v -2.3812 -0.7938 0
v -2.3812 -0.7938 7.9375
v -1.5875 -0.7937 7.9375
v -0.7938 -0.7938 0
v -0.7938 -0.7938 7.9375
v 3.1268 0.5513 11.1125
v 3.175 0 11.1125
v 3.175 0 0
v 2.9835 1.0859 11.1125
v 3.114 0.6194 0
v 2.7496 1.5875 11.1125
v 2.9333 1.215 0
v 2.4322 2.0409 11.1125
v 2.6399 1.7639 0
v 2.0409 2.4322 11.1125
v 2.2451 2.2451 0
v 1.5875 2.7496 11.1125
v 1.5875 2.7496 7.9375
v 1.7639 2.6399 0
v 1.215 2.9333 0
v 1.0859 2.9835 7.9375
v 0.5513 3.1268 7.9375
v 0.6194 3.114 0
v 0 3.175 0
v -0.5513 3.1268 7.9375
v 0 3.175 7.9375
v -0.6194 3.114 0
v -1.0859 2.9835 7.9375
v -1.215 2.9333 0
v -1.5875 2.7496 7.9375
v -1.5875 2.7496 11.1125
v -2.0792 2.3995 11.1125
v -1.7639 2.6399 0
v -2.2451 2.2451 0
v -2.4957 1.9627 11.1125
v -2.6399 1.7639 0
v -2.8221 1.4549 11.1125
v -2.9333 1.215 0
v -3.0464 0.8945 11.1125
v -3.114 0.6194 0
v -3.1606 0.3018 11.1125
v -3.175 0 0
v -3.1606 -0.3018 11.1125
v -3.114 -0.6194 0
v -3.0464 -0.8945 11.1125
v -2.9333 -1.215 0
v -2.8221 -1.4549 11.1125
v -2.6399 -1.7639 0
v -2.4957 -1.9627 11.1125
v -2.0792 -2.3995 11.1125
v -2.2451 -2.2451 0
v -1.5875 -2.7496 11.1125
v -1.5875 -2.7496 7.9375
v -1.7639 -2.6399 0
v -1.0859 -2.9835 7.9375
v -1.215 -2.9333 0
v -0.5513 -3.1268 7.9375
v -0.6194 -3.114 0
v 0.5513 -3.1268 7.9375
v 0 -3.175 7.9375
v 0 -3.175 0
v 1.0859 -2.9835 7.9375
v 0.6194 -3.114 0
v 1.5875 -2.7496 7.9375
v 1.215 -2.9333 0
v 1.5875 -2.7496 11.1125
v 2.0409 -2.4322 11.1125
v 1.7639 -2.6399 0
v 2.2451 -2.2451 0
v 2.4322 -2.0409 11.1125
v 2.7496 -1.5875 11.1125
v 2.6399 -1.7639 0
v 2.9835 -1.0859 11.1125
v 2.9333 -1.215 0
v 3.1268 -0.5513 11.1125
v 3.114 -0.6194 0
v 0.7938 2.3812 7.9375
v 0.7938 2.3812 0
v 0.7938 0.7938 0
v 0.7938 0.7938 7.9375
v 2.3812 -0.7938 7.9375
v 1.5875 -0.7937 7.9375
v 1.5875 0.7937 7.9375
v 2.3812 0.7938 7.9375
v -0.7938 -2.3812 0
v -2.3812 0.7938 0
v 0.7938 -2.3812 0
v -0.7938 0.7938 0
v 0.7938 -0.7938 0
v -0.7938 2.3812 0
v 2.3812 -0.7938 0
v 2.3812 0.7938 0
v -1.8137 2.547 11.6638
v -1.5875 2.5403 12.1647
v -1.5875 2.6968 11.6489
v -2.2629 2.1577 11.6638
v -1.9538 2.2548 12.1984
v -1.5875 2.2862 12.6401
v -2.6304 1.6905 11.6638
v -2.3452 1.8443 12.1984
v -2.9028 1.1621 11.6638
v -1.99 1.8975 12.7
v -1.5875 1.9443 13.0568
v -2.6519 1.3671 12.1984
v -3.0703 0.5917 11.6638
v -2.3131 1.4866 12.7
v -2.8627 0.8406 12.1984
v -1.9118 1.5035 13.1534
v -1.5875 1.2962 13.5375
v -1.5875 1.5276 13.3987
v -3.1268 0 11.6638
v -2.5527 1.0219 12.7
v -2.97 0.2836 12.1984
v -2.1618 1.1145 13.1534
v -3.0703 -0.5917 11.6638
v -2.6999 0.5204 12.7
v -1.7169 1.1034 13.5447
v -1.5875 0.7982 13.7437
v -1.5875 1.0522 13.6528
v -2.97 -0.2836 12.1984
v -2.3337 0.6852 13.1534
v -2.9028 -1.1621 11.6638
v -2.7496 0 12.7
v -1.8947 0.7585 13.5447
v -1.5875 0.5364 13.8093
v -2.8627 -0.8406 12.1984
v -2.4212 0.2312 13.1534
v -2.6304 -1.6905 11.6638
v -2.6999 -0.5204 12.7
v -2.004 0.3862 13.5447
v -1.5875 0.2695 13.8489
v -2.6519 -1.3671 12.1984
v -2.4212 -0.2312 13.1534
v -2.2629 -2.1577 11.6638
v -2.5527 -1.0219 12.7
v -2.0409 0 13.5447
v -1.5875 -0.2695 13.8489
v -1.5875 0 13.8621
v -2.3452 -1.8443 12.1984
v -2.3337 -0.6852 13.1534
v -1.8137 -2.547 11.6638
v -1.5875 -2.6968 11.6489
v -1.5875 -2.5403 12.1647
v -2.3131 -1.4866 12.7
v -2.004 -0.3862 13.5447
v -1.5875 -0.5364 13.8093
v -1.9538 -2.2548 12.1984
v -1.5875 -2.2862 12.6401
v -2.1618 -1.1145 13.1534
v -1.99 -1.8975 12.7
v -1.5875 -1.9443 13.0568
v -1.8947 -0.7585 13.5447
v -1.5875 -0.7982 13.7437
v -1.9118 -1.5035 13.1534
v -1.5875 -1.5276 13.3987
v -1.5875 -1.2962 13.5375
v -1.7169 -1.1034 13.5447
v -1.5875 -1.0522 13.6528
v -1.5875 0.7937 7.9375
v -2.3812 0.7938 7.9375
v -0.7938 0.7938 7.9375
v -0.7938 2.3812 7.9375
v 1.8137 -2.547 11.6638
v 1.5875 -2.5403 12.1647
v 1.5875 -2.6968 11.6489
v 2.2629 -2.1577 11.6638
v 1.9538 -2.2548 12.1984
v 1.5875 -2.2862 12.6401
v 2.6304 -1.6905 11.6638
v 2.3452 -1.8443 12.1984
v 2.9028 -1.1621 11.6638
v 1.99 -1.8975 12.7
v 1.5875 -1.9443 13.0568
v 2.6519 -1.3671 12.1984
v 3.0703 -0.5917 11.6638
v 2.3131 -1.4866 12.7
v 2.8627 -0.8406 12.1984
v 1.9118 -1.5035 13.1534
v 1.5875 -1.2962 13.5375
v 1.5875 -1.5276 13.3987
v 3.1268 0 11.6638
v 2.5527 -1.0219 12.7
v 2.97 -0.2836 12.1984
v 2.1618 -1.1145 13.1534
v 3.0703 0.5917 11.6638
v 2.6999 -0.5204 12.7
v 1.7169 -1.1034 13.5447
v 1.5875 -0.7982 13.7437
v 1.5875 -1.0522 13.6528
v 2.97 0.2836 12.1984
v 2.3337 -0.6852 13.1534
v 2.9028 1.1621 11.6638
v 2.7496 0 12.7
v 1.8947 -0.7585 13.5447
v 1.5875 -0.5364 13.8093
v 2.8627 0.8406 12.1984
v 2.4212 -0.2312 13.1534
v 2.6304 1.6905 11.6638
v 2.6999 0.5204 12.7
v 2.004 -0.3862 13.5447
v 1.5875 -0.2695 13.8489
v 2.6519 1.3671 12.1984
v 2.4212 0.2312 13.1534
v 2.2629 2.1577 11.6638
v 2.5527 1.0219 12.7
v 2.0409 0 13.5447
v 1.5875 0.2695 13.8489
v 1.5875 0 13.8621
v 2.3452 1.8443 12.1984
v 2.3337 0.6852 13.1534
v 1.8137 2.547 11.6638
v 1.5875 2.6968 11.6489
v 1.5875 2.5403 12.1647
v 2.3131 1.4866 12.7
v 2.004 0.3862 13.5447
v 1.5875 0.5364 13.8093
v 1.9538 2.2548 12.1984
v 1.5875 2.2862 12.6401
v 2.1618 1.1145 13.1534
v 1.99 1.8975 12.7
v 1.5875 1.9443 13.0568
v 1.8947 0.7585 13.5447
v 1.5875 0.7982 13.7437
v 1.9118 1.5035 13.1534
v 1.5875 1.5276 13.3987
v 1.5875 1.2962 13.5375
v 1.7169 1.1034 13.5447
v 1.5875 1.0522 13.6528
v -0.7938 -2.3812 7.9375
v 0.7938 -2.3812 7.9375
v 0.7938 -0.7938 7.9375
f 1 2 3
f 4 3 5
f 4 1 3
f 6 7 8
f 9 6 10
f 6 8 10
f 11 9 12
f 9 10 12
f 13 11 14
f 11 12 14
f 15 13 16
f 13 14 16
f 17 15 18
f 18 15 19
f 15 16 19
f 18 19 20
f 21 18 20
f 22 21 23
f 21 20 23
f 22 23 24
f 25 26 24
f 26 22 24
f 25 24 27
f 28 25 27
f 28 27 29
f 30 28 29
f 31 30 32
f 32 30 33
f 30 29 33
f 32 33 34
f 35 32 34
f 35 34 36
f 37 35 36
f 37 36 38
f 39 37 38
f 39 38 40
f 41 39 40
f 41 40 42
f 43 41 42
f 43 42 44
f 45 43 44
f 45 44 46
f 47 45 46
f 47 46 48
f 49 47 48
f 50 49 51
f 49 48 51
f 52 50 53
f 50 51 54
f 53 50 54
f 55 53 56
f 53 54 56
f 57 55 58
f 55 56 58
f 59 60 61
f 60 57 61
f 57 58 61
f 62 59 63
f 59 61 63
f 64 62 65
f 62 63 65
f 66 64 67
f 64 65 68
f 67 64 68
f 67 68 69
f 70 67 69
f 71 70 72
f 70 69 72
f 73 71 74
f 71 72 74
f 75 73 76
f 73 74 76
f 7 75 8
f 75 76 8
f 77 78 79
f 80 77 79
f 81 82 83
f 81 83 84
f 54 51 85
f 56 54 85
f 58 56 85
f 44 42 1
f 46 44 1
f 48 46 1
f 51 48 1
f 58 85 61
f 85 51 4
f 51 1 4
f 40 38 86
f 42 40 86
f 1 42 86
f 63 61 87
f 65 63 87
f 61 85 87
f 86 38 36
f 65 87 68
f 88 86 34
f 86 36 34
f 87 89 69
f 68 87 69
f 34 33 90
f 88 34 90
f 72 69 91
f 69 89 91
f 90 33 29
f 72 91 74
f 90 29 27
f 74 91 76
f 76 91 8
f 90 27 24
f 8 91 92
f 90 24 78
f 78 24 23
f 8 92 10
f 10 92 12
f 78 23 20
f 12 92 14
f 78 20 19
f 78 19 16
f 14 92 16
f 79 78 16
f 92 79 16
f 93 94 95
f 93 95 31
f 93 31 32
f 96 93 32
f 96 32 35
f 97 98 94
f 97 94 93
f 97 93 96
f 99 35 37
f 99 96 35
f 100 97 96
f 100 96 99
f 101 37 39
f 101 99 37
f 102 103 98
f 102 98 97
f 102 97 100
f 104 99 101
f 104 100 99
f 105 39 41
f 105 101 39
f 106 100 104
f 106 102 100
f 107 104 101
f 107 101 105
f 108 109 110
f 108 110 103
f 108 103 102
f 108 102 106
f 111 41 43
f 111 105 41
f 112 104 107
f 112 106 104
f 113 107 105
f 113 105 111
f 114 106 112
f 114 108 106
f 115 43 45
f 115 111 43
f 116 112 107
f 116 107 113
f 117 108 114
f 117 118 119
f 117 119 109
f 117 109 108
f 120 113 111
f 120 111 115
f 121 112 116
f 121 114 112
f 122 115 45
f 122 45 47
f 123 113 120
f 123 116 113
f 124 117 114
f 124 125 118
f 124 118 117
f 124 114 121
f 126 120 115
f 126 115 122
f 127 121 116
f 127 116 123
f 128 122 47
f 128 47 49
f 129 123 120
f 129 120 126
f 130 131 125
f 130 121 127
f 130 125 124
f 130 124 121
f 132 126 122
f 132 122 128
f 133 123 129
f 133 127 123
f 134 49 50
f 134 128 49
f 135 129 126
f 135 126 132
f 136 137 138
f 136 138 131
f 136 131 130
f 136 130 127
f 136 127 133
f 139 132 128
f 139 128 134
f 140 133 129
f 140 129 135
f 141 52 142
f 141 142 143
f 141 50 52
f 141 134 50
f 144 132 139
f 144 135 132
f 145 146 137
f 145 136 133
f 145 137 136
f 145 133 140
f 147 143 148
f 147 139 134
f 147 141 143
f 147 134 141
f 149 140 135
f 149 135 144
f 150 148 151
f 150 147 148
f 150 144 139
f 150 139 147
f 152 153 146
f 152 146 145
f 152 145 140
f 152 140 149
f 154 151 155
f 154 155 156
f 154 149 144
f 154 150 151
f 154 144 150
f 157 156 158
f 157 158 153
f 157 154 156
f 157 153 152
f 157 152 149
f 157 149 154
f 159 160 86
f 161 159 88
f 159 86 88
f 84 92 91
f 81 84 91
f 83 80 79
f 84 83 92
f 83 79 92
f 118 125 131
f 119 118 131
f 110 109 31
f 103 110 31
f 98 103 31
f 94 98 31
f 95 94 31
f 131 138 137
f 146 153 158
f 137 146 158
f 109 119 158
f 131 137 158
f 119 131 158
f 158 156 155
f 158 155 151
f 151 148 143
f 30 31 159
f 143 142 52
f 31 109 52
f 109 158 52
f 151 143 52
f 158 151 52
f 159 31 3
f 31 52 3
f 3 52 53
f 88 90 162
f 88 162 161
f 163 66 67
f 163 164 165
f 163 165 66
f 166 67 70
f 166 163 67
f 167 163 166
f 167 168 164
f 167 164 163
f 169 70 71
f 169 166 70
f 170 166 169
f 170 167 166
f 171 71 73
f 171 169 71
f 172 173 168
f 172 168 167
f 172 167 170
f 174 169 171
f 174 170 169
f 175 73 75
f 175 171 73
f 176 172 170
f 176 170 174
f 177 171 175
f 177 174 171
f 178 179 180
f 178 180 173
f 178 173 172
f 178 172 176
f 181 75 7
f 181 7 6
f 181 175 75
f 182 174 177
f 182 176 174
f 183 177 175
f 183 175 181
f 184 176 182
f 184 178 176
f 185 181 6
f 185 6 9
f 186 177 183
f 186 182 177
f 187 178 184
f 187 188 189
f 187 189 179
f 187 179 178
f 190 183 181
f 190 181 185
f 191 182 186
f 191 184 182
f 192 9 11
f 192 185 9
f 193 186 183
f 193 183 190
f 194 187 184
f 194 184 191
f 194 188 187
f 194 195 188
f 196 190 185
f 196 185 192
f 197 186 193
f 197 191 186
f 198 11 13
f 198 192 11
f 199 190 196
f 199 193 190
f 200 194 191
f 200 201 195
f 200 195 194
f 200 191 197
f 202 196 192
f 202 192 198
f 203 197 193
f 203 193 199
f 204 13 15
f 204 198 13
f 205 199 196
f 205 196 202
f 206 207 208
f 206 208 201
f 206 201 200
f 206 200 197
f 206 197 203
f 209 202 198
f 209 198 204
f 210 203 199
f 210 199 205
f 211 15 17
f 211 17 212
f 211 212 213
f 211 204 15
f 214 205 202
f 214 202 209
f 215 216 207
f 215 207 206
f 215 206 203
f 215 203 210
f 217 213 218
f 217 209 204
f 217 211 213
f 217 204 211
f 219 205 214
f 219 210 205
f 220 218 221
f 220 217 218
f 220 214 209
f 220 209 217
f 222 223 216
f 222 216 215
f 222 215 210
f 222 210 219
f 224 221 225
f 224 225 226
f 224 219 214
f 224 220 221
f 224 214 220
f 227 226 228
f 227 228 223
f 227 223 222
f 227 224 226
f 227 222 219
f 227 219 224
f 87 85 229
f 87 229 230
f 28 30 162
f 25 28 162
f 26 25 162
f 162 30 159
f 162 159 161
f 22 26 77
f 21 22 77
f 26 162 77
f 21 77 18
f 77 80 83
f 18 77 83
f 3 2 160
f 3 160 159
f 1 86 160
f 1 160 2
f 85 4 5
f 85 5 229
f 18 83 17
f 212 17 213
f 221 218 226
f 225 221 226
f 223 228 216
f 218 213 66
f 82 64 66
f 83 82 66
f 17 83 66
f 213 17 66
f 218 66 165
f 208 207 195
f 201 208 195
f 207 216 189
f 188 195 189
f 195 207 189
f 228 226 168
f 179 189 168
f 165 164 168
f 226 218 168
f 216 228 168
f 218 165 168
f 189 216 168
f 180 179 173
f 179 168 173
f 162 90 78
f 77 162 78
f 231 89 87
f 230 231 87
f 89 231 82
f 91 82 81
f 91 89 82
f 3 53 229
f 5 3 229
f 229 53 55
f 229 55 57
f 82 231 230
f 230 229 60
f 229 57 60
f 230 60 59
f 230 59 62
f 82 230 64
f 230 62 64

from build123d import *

# Parameters (mm, degrees)
F0_R     = 3.175
F1_DEPTH = 14.2875
F2_R     = 3.175
F4_DEPTH = 12.7
F5_W     = 1.5875
F5_H     = 1.5875
F6_DEPTH = 7.9375


with BuildPart() as f1:
    # F0 (on Top) → F1 (new body)
    with BuildSketch(Plane.XY):
        Circle(F0_R)
    extrude(amount=F1_DEPTH)

    # F2
    f2_edges = [f1.edges().sort_by_distance(p)[0] for p in [
        (-3.175, 0, 14.2875),
    ]]
    fillet(f2_edges, radius=F2_R)

    # F3 (on Front) → F4 (cut, symmetric)
    with BuildSketch(Plane.XZ):
        Polygon((-1.5875, 7.9375), (0, 7.9375), (1.5875, 7.9375), (1.5875, 14.9094229564), (-1.5875, 14.9094229564), align=None)
    extrude(amount=F4_DEPTH, both=True, mode=Mode.SUBTRACT)

    # F5 (on face) → F6 (cut)
    with BuildSketch(Plane(origin=(0, 0, 0), x_dir=(1, 0, 0), z_dir=(0, 0, -1))):
        with Locations((-1.5875, 0)):
            Rectangle(F5_W, F5_H)
        with Locations((0, 1.5875)):
            Rectangle(F5_W, F5_H)
        Rectangle(F5_W, F5_H)
        with Locations((1.5875, 0)):
            Rectangle(F5_W, F5_H)
        with Locations((0, -1.5875)):
            Rectangle(F5_W, F5_H)
    extrude(amount=-F6_DEPTH, mode=Mode.SUBTRACT)


solid = f1.part
